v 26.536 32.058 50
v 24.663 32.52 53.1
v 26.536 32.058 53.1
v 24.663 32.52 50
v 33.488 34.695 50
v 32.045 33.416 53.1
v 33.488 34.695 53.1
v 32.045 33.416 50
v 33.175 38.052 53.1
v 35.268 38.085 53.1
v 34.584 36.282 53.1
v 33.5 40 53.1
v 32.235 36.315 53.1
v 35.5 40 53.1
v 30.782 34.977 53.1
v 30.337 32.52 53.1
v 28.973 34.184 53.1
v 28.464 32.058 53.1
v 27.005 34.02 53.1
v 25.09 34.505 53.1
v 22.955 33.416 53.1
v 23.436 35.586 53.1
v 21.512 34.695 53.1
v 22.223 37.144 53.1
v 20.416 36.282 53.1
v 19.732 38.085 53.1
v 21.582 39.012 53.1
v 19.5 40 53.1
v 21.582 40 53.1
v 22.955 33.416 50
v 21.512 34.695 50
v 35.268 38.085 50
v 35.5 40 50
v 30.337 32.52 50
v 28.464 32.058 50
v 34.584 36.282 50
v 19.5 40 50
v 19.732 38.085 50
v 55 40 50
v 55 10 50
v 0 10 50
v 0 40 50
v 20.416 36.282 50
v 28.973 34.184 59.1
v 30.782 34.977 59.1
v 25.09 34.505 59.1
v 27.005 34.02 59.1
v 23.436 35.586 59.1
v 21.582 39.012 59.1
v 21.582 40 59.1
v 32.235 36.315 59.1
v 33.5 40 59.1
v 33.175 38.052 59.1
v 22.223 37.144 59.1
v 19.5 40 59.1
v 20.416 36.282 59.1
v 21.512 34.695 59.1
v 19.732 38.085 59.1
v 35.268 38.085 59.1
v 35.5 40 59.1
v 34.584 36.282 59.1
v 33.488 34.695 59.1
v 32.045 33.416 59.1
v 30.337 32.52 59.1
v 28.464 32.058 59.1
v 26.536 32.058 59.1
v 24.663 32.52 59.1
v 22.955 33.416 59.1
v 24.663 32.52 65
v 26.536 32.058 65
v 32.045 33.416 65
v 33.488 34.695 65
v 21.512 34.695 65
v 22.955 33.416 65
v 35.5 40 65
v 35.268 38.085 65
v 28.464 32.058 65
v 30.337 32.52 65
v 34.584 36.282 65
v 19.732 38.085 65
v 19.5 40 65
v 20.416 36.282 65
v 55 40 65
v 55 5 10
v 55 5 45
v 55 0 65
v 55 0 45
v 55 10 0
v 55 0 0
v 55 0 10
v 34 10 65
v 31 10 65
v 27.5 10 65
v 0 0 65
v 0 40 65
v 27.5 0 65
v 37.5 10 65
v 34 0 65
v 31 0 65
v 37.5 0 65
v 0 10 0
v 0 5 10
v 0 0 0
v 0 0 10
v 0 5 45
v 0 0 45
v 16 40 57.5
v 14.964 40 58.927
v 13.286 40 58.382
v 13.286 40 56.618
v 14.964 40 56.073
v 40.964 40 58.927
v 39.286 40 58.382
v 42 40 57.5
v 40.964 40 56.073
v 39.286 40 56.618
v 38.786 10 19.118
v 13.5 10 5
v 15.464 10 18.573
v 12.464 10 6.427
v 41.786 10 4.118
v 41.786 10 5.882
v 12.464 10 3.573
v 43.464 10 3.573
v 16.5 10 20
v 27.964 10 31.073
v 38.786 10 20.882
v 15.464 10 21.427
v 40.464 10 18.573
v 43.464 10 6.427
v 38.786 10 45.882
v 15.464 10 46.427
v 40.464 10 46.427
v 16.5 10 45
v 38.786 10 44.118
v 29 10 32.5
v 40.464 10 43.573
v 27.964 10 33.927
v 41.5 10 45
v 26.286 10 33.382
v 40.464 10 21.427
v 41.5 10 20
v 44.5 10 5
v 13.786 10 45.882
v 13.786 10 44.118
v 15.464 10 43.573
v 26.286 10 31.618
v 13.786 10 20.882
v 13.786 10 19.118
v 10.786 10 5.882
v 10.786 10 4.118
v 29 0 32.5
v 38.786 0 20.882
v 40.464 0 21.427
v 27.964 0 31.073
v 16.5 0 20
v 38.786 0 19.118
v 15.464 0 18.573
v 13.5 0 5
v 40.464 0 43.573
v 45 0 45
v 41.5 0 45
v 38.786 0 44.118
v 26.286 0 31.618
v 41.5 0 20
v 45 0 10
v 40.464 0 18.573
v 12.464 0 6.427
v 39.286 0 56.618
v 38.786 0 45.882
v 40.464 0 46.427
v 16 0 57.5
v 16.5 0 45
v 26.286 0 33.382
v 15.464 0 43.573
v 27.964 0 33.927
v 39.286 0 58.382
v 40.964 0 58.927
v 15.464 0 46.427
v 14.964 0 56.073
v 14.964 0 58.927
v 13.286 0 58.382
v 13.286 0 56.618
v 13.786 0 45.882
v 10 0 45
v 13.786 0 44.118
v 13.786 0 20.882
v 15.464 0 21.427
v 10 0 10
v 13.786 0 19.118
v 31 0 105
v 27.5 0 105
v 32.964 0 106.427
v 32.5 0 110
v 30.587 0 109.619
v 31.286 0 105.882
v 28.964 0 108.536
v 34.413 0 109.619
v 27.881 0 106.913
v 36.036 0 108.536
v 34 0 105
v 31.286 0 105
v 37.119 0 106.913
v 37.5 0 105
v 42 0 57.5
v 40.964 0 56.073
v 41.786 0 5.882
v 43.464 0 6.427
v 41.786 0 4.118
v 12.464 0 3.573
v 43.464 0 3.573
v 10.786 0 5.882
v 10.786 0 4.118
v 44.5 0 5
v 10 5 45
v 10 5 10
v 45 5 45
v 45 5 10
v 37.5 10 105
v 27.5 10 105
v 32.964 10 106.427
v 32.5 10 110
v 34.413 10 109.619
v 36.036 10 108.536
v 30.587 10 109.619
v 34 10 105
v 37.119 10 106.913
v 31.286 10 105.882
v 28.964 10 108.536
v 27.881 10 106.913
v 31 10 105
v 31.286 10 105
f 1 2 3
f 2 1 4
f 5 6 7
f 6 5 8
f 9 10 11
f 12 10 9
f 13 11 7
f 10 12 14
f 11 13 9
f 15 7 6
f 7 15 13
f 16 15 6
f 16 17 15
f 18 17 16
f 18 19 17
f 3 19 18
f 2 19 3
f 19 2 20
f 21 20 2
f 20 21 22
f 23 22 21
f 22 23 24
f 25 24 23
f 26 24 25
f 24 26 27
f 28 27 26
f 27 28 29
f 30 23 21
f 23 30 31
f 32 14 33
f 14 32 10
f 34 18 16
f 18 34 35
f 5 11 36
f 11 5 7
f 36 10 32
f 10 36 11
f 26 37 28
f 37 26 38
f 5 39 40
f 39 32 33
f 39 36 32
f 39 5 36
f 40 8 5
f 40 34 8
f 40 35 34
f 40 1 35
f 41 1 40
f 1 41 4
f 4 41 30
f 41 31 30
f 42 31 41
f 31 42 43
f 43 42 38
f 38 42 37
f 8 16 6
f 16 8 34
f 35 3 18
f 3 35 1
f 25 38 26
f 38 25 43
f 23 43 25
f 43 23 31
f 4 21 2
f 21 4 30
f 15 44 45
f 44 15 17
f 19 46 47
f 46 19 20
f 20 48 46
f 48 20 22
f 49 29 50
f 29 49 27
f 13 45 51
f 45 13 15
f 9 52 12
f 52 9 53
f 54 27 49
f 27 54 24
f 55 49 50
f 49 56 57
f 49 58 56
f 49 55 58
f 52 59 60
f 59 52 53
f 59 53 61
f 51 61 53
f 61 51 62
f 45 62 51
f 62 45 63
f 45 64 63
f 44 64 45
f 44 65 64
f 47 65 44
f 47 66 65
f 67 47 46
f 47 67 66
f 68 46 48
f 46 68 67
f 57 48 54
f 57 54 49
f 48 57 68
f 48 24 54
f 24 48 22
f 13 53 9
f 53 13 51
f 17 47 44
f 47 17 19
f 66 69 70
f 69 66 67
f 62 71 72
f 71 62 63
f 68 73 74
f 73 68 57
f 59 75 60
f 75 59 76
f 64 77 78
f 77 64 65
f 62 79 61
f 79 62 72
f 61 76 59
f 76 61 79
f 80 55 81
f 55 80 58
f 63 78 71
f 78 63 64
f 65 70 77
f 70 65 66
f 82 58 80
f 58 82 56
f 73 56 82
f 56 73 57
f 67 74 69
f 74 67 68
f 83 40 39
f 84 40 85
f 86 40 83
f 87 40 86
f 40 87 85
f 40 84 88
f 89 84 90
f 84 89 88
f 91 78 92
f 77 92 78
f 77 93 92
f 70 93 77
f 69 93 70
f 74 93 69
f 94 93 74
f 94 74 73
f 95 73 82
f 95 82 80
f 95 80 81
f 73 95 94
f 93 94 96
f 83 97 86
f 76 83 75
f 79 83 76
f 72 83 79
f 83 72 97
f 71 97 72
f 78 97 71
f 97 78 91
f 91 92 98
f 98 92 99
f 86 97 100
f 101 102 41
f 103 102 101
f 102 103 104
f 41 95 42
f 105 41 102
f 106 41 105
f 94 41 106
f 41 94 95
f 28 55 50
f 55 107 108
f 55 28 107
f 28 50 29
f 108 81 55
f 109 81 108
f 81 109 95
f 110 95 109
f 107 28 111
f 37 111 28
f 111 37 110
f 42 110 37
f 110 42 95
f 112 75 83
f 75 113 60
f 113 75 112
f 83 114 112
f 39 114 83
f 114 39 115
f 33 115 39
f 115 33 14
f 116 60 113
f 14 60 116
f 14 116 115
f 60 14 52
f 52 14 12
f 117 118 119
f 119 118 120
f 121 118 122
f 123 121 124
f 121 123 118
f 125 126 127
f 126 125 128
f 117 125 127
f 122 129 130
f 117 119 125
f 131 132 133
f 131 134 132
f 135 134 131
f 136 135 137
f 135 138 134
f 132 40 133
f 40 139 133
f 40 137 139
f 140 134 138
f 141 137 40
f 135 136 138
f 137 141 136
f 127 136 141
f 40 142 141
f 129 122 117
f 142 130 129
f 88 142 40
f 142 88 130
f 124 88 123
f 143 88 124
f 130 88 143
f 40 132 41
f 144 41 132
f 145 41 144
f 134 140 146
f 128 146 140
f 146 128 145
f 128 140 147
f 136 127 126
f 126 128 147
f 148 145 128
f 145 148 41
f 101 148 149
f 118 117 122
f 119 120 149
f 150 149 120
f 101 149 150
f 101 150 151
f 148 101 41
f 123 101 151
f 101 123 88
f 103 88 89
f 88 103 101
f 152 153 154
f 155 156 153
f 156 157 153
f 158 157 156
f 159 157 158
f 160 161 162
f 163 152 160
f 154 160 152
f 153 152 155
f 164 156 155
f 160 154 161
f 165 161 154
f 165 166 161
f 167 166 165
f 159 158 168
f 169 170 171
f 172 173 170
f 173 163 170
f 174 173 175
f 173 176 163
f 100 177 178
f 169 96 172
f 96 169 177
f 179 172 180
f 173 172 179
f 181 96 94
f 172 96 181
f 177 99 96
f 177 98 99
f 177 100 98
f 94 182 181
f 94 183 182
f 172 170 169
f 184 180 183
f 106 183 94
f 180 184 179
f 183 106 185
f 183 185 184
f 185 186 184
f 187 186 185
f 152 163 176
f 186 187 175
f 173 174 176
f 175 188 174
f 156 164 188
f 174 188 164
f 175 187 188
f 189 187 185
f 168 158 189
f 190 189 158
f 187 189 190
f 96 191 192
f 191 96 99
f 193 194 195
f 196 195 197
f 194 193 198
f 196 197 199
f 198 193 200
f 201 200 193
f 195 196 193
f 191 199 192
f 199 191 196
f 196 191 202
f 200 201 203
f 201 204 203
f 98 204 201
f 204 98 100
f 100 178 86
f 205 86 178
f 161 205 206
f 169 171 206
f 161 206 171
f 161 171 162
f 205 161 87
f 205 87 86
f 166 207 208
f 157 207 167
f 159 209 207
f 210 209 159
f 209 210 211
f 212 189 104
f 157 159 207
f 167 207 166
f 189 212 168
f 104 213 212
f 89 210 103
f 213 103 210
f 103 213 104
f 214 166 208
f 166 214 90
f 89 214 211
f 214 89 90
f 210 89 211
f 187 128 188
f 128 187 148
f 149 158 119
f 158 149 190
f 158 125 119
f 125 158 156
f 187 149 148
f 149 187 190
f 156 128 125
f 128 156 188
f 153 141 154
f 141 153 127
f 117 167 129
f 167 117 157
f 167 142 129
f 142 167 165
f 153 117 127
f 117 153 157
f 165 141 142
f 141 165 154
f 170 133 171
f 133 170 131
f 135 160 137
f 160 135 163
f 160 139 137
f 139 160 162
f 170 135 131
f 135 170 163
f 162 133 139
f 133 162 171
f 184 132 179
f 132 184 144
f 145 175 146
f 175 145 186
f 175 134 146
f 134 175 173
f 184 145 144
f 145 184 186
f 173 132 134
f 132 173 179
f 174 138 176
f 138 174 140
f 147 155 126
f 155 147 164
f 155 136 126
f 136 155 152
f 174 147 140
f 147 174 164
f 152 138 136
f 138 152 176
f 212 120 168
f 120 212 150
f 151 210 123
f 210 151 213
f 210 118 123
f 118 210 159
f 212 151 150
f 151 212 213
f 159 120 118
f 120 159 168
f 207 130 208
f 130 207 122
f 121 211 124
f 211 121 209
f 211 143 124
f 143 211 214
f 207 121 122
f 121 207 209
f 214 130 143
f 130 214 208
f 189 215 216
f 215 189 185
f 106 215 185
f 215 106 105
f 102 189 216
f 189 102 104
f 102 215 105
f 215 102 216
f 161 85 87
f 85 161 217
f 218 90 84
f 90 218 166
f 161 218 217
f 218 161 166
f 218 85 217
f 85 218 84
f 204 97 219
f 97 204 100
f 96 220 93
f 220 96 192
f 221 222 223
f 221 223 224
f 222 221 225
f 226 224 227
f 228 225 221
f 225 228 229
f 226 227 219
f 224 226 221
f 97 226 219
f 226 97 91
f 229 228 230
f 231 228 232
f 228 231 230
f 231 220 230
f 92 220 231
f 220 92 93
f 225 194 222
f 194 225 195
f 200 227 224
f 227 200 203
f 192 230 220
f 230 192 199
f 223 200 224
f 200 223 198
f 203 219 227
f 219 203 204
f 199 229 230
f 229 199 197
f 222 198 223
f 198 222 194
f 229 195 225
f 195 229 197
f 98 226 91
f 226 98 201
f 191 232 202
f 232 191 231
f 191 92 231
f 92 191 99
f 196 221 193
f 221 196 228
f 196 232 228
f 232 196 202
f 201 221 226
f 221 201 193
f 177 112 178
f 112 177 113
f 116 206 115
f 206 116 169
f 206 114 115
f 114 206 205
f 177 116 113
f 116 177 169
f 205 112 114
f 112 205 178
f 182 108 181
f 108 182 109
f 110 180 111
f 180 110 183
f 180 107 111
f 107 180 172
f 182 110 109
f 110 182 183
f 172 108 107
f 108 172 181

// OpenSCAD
//x carrage mount
//height
height = 65;
//length
length = 55;
//width
width = 10;
// hole size
holesize = 3;
//cutout height
Cheight = 35;
//cutout width
Cwidth = 10;
//cutout depth
Cdepth = 5;
//distance between hole for mounting hotend
mount_h_distance = 26;

//groovemount parts
//larger cylinder of groove mount
groove_large = 16;
//smaller cylinder of groove mount
groove_small = 12;
//groove large cylinder height mount
groove_large_h = 7;
//groove small cylinder height mount
groove_small_h = 6;
//bottom groove height
bottom_groove_h = 3.1;
//mount block distance away from surface
mount_width = 30;
//mount block height from bottom
mount_height = 50;

//pillar parts
//pillar height
p_height = 40;
//pillar width
p_width = 10;
//pillar hole
p_hole = 3;

difference(){//make final screw holes
    union(){ //combine groovemount to mounting plate
        difference(){ //make the groove mount
            
            translate([0,width,mount_height])cube([length, mount_width,15]);
            translate([length/2,width+mount_width,mount_height]) union(){ //grovemount to cut out
                
                cylinder(d=groove_large, h =bottom_groove_h);
                translate([0,0,bottom_groove_h]) cylinder(d=groove_small , h=groove_small_h);
                translate([0,0,groove_small_h+ bottom_groove_h]) cylinder(d=groove_large , h=groove_large_h);
            }
        }
        difference(){ //make the mounting plate
        
            
        
            //the cube
            cube([length, width, height]); 
            
            //the holes
            translate([15,0,20]) rotate([270,0,0]) cylinder( d=holesize , h = width);
            translate([40,0,20]) rotate([270,0,0]) cylinder( d=holesize , h = width);
            translate([40,0,45]) rotate([270,0,0]) cylinder( d=holesize , h = width);
            translate([15,0,45]) rotate([270,0,0]) cylinder( d=holesize , h = width);
            translate([length/2,0,height/2]) rotate([270,0,0]) cylinder( d=holesize , h = width);
            translate([12,0,5]) rotate([270,0,0]) cylinder( d=holesize , h = width);
            translate([43,0,5]) rotate([270,0,0]) cylinder( d=holesize , h = width);
            //the cutouts
            translate([0,0,10]) cube([Cwidth, Cdepth, Cheight]);
            translate([length-Cwidth,0,10]) cube([Cwidth, Cdepth, Cheight]);
            
        }

        difference(){//support riser/pillar thing
            union(){
                translate([length/2, 0, height]) cube([p_width, width, p_height]);
                translate([length/2+p_width/2,0, height+p_height]) rotate([270,0,0]) cylinder(d=p_width, h=width);
                }
                hole_offset = length/2+ (p_width-p_hole)/2;
                translate([hole_offset, 0, height]) cube([p_hole, width, p_height]);
                translate([length/2+p_width/2,0, height+p_height]) rotate([270,0,0]) cylinder(d=p_hole, h=width);
            }
    }
    translate([length/2 +mount_h_distance/2,0,mount_height+7.5]) rotate([270,0,0]) cylinder(d=holesize, h=width+mount_width);
    translate([length/2 -mount_h_distance/2,0,mount_height+7.5]) rotate([270,0,0]) cylinder(d=holesize, h=width+mount_width);
    
    //this is where the mounting screw holes to each side of the groovemoutn will go
}
